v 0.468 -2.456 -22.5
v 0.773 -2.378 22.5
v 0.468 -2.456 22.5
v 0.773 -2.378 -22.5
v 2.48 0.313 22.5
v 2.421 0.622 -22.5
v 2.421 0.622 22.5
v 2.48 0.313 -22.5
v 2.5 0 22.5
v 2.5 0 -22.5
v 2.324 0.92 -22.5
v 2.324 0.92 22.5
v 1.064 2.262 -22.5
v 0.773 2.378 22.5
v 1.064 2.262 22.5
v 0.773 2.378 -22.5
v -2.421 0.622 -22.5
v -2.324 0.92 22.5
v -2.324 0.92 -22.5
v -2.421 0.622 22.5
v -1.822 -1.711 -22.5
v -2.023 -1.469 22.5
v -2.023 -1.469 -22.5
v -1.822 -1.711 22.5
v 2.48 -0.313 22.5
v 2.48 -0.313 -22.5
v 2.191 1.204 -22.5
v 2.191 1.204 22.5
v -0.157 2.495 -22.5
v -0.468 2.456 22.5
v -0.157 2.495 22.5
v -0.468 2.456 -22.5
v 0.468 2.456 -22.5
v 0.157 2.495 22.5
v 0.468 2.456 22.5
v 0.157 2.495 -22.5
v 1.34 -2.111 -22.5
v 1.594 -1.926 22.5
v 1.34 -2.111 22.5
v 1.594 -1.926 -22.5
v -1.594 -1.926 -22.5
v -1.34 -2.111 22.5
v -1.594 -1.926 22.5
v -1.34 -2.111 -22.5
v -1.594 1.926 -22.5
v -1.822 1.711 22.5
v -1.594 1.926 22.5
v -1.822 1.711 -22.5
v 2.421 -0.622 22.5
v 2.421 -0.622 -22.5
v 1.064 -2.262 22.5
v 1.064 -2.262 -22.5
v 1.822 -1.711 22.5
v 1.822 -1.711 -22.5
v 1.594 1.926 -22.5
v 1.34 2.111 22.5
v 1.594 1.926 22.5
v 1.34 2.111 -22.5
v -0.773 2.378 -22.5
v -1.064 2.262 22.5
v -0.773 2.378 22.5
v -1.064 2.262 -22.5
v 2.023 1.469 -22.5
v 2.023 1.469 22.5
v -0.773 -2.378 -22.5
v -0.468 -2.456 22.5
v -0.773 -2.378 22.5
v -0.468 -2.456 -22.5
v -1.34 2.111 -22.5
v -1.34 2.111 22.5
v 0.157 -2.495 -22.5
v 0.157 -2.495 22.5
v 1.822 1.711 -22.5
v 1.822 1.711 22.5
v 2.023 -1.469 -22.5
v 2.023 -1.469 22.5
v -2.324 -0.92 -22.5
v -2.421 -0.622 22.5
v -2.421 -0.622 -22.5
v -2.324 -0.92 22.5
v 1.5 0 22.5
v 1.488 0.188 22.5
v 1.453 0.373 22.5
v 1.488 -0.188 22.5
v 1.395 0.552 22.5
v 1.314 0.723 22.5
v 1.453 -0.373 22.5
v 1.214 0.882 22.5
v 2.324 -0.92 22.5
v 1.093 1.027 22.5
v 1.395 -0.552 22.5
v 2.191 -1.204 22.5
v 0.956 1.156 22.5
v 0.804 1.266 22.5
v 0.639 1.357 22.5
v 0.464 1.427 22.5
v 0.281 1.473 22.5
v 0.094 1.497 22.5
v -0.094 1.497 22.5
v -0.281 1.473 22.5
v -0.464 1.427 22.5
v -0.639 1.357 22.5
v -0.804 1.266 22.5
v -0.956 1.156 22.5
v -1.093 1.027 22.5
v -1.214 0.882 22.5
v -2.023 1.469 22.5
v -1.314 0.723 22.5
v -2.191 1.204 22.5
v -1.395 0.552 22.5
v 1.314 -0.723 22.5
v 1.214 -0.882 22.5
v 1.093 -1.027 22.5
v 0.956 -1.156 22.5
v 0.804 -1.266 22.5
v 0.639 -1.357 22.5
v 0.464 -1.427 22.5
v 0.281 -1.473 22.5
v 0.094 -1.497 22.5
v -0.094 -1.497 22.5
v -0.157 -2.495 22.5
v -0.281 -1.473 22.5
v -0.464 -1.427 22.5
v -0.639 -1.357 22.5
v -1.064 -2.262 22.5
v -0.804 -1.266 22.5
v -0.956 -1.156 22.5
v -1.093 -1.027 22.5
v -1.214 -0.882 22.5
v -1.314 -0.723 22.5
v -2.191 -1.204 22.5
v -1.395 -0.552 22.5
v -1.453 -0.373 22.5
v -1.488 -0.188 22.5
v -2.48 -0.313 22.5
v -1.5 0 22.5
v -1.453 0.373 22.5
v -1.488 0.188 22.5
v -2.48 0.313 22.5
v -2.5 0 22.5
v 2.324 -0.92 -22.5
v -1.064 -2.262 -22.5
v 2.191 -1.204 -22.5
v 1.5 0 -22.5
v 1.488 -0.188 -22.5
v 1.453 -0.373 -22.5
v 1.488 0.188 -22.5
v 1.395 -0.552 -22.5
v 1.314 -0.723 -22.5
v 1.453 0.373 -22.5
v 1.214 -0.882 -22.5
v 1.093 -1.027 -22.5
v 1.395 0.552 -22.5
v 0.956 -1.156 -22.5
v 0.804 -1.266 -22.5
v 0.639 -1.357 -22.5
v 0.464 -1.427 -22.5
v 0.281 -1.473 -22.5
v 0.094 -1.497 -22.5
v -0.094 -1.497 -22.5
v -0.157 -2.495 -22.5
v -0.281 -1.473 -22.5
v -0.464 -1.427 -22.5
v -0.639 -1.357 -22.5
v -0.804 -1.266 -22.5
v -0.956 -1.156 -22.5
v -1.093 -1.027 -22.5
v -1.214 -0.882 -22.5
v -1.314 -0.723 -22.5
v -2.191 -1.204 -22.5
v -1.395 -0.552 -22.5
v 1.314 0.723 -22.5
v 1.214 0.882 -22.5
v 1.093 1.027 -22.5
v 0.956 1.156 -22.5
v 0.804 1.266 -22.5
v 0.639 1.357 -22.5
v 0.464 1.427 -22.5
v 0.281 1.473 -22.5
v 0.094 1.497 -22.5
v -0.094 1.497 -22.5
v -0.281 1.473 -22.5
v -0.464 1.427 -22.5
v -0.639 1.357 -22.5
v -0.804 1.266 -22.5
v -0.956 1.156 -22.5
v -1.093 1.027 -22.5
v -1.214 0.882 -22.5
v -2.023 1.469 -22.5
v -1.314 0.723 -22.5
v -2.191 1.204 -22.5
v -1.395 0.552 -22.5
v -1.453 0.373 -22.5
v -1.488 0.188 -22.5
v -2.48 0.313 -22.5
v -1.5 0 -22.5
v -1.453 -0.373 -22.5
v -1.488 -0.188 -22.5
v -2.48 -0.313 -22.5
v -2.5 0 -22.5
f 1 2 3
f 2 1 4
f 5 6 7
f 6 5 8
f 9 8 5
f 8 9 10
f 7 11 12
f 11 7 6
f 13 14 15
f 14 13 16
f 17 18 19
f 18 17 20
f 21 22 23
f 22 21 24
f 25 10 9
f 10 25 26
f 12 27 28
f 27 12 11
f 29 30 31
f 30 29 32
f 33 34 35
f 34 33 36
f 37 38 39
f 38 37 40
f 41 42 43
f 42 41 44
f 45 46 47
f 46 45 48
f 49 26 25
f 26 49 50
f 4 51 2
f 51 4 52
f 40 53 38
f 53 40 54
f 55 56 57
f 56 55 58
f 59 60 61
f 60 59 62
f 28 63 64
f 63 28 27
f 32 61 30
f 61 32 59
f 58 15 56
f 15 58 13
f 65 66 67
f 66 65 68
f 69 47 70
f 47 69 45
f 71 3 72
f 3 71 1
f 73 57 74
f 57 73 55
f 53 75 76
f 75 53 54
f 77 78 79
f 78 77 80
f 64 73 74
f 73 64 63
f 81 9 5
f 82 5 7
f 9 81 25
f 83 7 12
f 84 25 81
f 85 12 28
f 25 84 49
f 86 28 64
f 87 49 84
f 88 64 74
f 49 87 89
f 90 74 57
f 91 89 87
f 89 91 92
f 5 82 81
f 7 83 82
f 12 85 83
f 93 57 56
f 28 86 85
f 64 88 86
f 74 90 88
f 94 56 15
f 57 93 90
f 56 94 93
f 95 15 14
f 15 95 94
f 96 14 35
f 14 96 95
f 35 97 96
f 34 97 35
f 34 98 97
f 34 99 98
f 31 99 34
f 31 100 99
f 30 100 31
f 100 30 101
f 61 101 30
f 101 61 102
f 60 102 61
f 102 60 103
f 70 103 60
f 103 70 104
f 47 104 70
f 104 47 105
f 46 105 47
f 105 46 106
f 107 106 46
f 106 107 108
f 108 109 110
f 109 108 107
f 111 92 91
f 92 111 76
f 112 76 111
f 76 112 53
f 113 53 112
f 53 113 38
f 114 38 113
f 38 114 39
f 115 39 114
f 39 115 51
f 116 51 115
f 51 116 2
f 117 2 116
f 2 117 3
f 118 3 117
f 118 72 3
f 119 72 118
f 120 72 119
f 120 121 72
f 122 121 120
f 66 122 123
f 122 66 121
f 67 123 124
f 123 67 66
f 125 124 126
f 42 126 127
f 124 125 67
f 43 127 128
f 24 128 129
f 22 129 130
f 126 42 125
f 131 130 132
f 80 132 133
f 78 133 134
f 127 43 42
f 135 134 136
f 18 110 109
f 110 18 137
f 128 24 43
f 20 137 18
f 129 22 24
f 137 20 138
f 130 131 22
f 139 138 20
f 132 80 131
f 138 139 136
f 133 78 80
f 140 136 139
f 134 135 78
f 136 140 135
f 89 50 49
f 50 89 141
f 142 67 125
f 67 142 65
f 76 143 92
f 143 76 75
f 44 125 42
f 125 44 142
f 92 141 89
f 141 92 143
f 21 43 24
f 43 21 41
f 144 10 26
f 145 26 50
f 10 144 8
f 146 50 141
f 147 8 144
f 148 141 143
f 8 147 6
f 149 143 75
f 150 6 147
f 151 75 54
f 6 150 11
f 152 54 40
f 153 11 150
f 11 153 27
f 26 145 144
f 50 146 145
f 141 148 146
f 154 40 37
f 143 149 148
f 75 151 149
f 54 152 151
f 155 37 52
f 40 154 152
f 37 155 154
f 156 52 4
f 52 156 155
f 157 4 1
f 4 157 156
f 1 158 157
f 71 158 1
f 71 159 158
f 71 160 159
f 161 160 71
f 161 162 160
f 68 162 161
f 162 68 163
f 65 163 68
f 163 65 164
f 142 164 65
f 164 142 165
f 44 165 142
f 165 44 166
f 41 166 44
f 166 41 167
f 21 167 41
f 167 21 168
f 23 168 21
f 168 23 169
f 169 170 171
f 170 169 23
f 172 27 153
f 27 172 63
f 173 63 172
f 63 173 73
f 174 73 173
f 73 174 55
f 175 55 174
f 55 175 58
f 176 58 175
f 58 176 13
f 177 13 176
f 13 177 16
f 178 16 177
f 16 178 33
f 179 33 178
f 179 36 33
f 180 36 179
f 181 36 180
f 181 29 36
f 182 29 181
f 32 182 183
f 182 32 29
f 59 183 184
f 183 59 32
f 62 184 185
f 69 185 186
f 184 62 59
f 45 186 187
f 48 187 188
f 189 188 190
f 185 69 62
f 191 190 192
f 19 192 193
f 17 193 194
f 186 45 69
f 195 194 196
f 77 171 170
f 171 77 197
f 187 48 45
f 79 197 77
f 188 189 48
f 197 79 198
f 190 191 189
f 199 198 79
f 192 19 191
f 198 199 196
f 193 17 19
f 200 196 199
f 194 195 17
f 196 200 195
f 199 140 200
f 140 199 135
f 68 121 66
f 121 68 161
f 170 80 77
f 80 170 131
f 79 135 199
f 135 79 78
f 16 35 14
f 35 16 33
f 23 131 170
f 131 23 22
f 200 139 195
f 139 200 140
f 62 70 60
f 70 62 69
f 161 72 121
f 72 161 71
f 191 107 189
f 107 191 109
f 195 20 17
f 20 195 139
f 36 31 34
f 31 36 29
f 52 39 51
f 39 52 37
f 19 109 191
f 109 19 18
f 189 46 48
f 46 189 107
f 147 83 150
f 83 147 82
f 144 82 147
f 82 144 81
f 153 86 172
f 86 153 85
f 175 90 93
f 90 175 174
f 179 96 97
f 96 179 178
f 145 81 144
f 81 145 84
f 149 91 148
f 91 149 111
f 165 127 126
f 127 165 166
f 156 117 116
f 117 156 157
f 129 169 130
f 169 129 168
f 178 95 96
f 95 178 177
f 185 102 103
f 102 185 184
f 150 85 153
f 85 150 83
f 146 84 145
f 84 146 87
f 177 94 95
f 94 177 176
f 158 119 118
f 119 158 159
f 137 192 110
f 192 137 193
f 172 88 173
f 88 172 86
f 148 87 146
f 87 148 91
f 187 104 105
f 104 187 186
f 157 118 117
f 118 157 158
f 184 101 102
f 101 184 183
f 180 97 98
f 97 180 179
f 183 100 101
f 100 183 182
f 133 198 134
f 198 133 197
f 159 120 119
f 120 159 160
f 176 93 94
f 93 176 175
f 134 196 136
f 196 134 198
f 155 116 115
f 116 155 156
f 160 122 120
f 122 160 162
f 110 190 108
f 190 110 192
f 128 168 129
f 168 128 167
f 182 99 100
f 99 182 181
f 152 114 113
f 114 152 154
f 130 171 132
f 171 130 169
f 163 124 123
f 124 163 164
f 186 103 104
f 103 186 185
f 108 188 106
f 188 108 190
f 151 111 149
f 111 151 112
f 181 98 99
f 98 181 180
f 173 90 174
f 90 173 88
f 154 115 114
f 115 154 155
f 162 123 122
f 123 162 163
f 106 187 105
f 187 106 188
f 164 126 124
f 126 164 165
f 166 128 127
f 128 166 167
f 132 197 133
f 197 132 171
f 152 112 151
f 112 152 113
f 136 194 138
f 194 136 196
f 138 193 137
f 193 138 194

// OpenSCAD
$fn = 50;


difference() {
	union() {
		translate(v = [0, 0, -22.5000000000]) {
			cylinder(h = 45, r = 2.5000000000);
		}
	}
	union() {
		translate(v = [0, 0, -100.0000000000]) {
			cylinder(h = 200, r = 1.5000000000);
		}
	}
}
